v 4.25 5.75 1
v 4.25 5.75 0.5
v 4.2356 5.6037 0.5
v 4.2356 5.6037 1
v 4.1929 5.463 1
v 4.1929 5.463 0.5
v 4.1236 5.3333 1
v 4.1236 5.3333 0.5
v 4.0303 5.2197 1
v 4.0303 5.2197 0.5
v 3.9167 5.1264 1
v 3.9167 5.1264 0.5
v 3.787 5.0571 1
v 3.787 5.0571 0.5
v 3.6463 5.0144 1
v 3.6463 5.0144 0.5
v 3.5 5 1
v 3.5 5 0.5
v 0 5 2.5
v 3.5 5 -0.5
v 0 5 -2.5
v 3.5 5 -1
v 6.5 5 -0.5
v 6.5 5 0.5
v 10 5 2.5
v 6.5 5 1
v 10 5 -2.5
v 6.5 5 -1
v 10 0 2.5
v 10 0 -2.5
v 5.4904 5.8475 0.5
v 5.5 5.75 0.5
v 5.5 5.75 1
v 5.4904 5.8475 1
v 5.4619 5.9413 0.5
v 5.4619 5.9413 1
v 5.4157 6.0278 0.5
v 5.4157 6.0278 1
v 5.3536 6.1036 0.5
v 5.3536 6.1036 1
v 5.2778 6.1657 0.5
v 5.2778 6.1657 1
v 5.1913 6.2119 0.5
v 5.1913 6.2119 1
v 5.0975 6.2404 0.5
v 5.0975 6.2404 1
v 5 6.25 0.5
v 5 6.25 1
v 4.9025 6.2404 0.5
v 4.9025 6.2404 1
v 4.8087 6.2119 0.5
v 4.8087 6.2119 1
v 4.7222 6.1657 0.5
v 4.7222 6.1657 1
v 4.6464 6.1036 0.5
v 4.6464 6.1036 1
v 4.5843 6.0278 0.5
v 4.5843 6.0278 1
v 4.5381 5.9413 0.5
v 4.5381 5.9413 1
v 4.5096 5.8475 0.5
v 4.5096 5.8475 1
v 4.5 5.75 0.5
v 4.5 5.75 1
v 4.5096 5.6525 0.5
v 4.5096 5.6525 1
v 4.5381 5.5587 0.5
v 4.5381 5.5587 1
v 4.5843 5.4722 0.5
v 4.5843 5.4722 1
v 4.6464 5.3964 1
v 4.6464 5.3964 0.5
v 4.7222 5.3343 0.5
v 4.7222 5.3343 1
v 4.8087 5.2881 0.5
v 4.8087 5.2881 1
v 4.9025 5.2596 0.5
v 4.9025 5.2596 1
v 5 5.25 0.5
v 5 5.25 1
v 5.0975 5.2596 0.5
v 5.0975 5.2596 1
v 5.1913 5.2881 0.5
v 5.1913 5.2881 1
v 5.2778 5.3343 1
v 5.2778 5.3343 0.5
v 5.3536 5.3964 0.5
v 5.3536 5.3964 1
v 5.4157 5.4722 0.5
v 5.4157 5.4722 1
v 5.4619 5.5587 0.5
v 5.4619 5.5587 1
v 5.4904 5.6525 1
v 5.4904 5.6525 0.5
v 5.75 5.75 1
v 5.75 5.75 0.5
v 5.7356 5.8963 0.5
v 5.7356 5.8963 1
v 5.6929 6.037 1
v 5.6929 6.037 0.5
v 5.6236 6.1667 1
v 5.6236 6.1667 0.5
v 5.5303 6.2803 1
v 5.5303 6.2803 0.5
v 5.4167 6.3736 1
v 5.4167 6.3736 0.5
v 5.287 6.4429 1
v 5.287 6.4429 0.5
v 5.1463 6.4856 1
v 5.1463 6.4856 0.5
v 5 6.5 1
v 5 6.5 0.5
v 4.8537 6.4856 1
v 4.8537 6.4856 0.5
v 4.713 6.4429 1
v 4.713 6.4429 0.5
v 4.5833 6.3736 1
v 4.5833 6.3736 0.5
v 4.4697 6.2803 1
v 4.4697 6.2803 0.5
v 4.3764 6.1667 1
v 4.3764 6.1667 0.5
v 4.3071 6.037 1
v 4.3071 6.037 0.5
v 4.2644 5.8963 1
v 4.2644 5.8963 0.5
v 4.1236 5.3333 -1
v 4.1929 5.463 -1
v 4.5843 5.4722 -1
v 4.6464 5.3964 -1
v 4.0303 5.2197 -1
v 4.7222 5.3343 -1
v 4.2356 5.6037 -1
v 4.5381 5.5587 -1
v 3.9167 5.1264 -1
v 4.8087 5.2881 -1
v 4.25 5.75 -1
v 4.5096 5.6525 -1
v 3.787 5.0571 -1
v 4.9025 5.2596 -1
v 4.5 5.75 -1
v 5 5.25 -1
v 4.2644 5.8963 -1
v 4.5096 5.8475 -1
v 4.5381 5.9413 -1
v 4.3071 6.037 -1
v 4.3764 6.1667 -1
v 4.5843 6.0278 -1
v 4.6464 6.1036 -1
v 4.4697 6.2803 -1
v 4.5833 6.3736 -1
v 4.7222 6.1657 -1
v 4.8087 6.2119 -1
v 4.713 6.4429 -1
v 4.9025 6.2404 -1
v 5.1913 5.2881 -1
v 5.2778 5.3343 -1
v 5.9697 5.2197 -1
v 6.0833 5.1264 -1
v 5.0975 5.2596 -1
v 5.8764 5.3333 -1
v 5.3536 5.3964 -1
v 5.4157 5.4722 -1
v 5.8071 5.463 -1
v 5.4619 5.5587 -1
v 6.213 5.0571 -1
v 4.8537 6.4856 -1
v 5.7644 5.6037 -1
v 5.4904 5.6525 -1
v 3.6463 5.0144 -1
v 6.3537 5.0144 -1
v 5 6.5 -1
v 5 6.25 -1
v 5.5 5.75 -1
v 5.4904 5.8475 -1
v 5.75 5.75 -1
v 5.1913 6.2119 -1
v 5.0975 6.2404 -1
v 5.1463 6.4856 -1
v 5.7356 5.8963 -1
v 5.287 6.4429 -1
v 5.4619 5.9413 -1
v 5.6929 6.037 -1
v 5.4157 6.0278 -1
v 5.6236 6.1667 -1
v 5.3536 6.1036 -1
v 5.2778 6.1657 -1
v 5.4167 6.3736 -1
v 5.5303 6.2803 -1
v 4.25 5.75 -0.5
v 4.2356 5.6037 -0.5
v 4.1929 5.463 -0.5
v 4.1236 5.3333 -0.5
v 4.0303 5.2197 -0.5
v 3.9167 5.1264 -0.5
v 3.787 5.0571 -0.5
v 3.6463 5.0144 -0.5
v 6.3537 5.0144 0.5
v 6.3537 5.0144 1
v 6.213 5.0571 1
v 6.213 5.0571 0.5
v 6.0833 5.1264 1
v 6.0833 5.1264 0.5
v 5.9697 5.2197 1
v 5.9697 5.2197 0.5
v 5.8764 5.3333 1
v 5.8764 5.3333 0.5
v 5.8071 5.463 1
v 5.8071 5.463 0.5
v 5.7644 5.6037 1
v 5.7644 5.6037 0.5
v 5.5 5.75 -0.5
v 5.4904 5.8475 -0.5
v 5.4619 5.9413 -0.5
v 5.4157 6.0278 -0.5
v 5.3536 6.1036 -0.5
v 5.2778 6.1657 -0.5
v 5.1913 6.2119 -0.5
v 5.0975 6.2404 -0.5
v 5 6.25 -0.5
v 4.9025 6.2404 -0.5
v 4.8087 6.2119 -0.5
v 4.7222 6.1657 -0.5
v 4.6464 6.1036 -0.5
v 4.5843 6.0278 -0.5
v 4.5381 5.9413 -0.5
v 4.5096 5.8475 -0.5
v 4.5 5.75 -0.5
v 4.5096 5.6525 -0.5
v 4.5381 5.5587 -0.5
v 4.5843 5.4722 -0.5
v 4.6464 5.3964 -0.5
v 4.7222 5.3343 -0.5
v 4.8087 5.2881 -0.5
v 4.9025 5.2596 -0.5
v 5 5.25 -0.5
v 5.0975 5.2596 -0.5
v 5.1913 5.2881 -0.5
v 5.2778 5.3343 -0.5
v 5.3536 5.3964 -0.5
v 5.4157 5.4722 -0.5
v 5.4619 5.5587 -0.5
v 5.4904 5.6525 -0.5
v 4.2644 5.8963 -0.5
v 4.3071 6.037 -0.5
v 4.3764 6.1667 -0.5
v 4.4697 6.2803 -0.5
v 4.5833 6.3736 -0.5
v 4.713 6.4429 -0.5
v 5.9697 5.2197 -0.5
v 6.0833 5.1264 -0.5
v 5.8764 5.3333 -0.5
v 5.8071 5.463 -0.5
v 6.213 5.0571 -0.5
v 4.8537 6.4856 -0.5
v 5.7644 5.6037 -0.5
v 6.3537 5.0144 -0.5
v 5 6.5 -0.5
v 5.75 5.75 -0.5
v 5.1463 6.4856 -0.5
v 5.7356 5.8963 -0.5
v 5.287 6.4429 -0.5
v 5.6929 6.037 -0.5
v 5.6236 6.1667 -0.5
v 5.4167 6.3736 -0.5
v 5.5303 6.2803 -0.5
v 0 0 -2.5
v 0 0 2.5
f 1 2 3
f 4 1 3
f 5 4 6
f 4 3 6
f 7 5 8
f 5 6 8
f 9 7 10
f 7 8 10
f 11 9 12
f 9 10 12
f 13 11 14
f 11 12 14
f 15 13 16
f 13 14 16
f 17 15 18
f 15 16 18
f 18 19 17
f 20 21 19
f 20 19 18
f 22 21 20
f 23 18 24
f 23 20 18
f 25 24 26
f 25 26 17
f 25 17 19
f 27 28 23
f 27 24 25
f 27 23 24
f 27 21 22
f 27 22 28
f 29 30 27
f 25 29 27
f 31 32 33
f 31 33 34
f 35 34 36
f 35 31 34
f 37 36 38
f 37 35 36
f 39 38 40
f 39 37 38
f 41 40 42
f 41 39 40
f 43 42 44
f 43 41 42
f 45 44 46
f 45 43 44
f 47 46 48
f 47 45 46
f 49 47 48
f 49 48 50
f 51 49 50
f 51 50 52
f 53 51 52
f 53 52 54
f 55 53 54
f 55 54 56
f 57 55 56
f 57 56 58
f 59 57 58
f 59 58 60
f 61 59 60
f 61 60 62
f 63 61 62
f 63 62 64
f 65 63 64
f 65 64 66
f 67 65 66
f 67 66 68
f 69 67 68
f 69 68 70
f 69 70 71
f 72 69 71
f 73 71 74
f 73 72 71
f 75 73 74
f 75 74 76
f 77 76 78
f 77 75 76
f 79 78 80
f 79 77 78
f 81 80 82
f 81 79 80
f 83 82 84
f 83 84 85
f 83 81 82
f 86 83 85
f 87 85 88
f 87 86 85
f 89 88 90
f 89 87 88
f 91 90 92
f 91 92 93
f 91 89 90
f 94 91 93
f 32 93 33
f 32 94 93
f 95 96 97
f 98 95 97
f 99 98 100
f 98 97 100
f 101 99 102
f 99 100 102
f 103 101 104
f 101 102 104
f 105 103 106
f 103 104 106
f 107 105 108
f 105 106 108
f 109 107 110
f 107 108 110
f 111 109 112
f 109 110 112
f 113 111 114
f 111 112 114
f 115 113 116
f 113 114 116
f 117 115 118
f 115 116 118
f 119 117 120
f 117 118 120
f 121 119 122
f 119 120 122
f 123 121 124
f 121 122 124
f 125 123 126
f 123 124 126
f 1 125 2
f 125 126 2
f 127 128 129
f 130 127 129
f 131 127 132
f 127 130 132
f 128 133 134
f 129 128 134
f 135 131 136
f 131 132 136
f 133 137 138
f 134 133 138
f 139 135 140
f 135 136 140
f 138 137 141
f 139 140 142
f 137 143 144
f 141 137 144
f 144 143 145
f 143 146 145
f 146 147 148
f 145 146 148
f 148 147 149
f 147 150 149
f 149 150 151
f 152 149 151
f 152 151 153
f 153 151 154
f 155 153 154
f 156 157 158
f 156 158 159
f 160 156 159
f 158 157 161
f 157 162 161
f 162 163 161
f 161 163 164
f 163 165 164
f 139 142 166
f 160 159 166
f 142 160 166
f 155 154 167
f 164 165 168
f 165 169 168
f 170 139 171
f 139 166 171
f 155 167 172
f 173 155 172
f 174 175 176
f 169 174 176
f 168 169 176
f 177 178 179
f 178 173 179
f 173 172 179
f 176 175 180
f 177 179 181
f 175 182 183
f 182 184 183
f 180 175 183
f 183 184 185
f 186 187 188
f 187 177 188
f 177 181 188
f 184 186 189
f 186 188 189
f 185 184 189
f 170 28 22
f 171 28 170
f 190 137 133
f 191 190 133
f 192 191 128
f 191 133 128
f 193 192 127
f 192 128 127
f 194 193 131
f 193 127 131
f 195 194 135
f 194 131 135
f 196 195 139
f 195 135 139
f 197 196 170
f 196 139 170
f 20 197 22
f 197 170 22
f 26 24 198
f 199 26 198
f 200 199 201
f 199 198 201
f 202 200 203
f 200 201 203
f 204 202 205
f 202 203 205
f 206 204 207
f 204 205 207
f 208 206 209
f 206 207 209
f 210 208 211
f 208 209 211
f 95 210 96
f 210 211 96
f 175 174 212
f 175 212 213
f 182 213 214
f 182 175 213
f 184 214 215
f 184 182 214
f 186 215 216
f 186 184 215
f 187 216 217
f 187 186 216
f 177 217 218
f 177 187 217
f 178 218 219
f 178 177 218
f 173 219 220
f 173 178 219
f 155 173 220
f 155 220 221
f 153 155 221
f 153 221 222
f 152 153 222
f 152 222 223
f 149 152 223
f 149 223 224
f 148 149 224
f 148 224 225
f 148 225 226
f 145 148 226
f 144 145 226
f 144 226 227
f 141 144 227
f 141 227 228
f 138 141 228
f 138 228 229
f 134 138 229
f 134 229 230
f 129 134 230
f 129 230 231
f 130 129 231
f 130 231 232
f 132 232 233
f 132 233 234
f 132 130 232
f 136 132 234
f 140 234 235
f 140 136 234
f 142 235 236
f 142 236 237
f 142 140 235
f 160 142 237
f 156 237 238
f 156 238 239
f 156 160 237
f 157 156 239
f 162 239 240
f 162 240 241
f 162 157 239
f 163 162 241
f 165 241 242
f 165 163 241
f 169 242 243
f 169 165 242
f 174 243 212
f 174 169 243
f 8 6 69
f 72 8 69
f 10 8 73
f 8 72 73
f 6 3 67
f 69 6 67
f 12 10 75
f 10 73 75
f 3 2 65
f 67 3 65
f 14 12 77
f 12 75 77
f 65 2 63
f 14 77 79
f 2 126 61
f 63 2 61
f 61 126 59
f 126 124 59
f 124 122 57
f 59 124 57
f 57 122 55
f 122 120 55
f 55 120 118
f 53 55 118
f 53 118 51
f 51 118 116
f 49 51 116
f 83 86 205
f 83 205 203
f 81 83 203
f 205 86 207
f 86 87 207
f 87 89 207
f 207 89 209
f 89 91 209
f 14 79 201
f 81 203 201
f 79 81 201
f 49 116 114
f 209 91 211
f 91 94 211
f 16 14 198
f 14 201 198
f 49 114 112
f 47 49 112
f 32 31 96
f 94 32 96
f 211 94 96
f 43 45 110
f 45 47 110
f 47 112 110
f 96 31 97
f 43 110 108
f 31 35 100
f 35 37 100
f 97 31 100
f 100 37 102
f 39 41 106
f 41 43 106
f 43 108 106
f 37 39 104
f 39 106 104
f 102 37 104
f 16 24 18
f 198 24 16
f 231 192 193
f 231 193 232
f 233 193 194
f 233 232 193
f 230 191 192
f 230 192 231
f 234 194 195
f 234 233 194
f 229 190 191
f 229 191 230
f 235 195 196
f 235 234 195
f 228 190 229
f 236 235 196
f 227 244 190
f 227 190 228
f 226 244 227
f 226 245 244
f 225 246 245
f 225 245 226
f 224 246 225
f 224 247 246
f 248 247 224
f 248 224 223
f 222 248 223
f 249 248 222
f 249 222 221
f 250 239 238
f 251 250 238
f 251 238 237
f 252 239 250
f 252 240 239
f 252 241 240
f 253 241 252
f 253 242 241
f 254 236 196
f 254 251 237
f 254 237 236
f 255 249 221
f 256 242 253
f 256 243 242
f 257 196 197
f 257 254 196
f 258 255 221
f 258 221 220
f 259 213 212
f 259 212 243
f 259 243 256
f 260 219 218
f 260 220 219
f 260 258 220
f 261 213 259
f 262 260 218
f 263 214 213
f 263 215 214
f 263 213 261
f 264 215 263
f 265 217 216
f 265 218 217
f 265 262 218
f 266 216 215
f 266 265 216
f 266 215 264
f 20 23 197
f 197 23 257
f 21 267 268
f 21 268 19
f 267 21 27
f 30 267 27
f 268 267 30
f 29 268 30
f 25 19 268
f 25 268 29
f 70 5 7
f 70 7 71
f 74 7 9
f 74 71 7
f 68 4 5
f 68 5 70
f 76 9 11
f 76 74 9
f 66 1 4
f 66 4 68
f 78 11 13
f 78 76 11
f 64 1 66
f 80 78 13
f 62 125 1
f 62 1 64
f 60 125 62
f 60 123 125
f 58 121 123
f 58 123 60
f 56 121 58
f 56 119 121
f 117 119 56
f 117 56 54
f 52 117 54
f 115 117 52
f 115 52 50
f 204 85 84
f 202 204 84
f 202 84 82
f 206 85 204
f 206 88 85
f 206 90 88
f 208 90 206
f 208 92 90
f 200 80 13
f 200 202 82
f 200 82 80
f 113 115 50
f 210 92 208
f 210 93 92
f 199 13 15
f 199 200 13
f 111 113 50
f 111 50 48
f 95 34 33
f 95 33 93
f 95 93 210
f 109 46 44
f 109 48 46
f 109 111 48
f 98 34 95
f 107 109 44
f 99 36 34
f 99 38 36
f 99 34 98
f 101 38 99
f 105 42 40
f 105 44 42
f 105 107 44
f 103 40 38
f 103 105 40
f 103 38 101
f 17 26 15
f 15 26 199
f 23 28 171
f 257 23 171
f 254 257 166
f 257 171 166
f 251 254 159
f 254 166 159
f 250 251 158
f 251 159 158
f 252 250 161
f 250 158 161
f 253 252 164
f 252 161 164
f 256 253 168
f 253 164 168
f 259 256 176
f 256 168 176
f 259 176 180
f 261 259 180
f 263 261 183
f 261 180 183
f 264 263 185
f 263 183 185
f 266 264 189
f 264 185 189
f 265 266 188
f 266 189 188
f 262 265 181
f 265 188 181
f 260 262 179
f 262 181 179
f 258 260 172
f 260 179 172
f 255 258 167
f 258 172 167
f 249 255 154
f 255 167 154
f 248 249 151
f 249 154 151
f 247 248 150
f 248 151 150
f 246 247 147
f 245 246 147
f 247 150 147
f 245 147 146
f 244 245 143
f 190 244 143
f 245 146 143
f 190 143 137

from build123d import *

# Parameters (mm, degrees)
EXTRUDE_1_DEPTH          = 2.5
EXTRUDE_1_DEPTH_BACK     = 2.5
EXTRUDE_3_DEPTH          = 1
EXTRUDE_3_DEPTH_BACK     = 1
SKETCH_2_6_R             = 0.5
CUT_EXTRUDE_1_DEPTH      = 0.5
CUT_EXTRUDE_1_DEPTH_BACK = 0.5
SKETCH_2_R               = 0.5


with BuildPart() as part:
    # 草圖1 → 填料-伸長1 (new, two sides: drawn at the far end of the back side and taken through both)
    with BuildSketch(Plane.XY.offset(-EXTRUDE_1_DEPTH_BACK)):
        Polygon((2, 5), (0, 5), (0, 0), (10, 0), (10, 5), (8, 5), align=None)
    extrude(amount=EXTRUDE_1_DEPTH + EXTRUDE_1_DEPTH_BACK)

    # 草圖2<6> → 填料-伸長3 (add, two sides: drawn at the far end of the back side and taken through both)
    with BuildSketch(Plane.XY.offset(-EXTRUDE_3_DEPTH_BACK)):
        with BuildLine():
            Line((3.5, 5), (6.5, 5))
            ThreePointArc((6.5, 5), (5.969669914, 5.219669914), (5.75, 5.75))
            ThreePointArc((5.75, 5.75), (5, 6.5), (4.25, 5.75))
            ThreePointArc((4.25, 5.75), (4.030330086, 5.219669914), (3.5, 5))
        make_face()
        with Locations((5, 5.75)):
            Circle(SKETCH_2_6_R, mode=Mode.SUBTRACT)
    extrude(amount=EXTRUDE_3_DEPTH + EXTRUDE_3_DEPTH_BACK)

    # 草圖2 → 除料-伸長1 (cut, two sides: drawn at the far end of the back side and taken through both)
    with BuildSketch(Plane.XY.offset(-CUT_EXTRUDE_1_DEPTH_BACK)):
        with BuildLine():
            Line((3.5, 5), (6.5, 5))
            ThreePointArc((6.5, 5), (5.969669914, 5.219669914), (5.75, 5.75))
            ThreePointArc((5.75, 5.75), (5, 6.5), (4.25, 5.75))
            ThreePointArc((4.25, 5.75), (4.030330086, 5.219669914), (3.5, 5))
        make_face()
        with Locations((5, 5.75)):
            Circle(SKETCH_2_R, mode=Mode.SUBTRACT)
    extrude(amount=CUT_EXTRUDE_1_DEPTH + CUT_EXTRUDE_1_DEPTH_BACK, mode=Mode.SUBTRACT)


solid = part.part
